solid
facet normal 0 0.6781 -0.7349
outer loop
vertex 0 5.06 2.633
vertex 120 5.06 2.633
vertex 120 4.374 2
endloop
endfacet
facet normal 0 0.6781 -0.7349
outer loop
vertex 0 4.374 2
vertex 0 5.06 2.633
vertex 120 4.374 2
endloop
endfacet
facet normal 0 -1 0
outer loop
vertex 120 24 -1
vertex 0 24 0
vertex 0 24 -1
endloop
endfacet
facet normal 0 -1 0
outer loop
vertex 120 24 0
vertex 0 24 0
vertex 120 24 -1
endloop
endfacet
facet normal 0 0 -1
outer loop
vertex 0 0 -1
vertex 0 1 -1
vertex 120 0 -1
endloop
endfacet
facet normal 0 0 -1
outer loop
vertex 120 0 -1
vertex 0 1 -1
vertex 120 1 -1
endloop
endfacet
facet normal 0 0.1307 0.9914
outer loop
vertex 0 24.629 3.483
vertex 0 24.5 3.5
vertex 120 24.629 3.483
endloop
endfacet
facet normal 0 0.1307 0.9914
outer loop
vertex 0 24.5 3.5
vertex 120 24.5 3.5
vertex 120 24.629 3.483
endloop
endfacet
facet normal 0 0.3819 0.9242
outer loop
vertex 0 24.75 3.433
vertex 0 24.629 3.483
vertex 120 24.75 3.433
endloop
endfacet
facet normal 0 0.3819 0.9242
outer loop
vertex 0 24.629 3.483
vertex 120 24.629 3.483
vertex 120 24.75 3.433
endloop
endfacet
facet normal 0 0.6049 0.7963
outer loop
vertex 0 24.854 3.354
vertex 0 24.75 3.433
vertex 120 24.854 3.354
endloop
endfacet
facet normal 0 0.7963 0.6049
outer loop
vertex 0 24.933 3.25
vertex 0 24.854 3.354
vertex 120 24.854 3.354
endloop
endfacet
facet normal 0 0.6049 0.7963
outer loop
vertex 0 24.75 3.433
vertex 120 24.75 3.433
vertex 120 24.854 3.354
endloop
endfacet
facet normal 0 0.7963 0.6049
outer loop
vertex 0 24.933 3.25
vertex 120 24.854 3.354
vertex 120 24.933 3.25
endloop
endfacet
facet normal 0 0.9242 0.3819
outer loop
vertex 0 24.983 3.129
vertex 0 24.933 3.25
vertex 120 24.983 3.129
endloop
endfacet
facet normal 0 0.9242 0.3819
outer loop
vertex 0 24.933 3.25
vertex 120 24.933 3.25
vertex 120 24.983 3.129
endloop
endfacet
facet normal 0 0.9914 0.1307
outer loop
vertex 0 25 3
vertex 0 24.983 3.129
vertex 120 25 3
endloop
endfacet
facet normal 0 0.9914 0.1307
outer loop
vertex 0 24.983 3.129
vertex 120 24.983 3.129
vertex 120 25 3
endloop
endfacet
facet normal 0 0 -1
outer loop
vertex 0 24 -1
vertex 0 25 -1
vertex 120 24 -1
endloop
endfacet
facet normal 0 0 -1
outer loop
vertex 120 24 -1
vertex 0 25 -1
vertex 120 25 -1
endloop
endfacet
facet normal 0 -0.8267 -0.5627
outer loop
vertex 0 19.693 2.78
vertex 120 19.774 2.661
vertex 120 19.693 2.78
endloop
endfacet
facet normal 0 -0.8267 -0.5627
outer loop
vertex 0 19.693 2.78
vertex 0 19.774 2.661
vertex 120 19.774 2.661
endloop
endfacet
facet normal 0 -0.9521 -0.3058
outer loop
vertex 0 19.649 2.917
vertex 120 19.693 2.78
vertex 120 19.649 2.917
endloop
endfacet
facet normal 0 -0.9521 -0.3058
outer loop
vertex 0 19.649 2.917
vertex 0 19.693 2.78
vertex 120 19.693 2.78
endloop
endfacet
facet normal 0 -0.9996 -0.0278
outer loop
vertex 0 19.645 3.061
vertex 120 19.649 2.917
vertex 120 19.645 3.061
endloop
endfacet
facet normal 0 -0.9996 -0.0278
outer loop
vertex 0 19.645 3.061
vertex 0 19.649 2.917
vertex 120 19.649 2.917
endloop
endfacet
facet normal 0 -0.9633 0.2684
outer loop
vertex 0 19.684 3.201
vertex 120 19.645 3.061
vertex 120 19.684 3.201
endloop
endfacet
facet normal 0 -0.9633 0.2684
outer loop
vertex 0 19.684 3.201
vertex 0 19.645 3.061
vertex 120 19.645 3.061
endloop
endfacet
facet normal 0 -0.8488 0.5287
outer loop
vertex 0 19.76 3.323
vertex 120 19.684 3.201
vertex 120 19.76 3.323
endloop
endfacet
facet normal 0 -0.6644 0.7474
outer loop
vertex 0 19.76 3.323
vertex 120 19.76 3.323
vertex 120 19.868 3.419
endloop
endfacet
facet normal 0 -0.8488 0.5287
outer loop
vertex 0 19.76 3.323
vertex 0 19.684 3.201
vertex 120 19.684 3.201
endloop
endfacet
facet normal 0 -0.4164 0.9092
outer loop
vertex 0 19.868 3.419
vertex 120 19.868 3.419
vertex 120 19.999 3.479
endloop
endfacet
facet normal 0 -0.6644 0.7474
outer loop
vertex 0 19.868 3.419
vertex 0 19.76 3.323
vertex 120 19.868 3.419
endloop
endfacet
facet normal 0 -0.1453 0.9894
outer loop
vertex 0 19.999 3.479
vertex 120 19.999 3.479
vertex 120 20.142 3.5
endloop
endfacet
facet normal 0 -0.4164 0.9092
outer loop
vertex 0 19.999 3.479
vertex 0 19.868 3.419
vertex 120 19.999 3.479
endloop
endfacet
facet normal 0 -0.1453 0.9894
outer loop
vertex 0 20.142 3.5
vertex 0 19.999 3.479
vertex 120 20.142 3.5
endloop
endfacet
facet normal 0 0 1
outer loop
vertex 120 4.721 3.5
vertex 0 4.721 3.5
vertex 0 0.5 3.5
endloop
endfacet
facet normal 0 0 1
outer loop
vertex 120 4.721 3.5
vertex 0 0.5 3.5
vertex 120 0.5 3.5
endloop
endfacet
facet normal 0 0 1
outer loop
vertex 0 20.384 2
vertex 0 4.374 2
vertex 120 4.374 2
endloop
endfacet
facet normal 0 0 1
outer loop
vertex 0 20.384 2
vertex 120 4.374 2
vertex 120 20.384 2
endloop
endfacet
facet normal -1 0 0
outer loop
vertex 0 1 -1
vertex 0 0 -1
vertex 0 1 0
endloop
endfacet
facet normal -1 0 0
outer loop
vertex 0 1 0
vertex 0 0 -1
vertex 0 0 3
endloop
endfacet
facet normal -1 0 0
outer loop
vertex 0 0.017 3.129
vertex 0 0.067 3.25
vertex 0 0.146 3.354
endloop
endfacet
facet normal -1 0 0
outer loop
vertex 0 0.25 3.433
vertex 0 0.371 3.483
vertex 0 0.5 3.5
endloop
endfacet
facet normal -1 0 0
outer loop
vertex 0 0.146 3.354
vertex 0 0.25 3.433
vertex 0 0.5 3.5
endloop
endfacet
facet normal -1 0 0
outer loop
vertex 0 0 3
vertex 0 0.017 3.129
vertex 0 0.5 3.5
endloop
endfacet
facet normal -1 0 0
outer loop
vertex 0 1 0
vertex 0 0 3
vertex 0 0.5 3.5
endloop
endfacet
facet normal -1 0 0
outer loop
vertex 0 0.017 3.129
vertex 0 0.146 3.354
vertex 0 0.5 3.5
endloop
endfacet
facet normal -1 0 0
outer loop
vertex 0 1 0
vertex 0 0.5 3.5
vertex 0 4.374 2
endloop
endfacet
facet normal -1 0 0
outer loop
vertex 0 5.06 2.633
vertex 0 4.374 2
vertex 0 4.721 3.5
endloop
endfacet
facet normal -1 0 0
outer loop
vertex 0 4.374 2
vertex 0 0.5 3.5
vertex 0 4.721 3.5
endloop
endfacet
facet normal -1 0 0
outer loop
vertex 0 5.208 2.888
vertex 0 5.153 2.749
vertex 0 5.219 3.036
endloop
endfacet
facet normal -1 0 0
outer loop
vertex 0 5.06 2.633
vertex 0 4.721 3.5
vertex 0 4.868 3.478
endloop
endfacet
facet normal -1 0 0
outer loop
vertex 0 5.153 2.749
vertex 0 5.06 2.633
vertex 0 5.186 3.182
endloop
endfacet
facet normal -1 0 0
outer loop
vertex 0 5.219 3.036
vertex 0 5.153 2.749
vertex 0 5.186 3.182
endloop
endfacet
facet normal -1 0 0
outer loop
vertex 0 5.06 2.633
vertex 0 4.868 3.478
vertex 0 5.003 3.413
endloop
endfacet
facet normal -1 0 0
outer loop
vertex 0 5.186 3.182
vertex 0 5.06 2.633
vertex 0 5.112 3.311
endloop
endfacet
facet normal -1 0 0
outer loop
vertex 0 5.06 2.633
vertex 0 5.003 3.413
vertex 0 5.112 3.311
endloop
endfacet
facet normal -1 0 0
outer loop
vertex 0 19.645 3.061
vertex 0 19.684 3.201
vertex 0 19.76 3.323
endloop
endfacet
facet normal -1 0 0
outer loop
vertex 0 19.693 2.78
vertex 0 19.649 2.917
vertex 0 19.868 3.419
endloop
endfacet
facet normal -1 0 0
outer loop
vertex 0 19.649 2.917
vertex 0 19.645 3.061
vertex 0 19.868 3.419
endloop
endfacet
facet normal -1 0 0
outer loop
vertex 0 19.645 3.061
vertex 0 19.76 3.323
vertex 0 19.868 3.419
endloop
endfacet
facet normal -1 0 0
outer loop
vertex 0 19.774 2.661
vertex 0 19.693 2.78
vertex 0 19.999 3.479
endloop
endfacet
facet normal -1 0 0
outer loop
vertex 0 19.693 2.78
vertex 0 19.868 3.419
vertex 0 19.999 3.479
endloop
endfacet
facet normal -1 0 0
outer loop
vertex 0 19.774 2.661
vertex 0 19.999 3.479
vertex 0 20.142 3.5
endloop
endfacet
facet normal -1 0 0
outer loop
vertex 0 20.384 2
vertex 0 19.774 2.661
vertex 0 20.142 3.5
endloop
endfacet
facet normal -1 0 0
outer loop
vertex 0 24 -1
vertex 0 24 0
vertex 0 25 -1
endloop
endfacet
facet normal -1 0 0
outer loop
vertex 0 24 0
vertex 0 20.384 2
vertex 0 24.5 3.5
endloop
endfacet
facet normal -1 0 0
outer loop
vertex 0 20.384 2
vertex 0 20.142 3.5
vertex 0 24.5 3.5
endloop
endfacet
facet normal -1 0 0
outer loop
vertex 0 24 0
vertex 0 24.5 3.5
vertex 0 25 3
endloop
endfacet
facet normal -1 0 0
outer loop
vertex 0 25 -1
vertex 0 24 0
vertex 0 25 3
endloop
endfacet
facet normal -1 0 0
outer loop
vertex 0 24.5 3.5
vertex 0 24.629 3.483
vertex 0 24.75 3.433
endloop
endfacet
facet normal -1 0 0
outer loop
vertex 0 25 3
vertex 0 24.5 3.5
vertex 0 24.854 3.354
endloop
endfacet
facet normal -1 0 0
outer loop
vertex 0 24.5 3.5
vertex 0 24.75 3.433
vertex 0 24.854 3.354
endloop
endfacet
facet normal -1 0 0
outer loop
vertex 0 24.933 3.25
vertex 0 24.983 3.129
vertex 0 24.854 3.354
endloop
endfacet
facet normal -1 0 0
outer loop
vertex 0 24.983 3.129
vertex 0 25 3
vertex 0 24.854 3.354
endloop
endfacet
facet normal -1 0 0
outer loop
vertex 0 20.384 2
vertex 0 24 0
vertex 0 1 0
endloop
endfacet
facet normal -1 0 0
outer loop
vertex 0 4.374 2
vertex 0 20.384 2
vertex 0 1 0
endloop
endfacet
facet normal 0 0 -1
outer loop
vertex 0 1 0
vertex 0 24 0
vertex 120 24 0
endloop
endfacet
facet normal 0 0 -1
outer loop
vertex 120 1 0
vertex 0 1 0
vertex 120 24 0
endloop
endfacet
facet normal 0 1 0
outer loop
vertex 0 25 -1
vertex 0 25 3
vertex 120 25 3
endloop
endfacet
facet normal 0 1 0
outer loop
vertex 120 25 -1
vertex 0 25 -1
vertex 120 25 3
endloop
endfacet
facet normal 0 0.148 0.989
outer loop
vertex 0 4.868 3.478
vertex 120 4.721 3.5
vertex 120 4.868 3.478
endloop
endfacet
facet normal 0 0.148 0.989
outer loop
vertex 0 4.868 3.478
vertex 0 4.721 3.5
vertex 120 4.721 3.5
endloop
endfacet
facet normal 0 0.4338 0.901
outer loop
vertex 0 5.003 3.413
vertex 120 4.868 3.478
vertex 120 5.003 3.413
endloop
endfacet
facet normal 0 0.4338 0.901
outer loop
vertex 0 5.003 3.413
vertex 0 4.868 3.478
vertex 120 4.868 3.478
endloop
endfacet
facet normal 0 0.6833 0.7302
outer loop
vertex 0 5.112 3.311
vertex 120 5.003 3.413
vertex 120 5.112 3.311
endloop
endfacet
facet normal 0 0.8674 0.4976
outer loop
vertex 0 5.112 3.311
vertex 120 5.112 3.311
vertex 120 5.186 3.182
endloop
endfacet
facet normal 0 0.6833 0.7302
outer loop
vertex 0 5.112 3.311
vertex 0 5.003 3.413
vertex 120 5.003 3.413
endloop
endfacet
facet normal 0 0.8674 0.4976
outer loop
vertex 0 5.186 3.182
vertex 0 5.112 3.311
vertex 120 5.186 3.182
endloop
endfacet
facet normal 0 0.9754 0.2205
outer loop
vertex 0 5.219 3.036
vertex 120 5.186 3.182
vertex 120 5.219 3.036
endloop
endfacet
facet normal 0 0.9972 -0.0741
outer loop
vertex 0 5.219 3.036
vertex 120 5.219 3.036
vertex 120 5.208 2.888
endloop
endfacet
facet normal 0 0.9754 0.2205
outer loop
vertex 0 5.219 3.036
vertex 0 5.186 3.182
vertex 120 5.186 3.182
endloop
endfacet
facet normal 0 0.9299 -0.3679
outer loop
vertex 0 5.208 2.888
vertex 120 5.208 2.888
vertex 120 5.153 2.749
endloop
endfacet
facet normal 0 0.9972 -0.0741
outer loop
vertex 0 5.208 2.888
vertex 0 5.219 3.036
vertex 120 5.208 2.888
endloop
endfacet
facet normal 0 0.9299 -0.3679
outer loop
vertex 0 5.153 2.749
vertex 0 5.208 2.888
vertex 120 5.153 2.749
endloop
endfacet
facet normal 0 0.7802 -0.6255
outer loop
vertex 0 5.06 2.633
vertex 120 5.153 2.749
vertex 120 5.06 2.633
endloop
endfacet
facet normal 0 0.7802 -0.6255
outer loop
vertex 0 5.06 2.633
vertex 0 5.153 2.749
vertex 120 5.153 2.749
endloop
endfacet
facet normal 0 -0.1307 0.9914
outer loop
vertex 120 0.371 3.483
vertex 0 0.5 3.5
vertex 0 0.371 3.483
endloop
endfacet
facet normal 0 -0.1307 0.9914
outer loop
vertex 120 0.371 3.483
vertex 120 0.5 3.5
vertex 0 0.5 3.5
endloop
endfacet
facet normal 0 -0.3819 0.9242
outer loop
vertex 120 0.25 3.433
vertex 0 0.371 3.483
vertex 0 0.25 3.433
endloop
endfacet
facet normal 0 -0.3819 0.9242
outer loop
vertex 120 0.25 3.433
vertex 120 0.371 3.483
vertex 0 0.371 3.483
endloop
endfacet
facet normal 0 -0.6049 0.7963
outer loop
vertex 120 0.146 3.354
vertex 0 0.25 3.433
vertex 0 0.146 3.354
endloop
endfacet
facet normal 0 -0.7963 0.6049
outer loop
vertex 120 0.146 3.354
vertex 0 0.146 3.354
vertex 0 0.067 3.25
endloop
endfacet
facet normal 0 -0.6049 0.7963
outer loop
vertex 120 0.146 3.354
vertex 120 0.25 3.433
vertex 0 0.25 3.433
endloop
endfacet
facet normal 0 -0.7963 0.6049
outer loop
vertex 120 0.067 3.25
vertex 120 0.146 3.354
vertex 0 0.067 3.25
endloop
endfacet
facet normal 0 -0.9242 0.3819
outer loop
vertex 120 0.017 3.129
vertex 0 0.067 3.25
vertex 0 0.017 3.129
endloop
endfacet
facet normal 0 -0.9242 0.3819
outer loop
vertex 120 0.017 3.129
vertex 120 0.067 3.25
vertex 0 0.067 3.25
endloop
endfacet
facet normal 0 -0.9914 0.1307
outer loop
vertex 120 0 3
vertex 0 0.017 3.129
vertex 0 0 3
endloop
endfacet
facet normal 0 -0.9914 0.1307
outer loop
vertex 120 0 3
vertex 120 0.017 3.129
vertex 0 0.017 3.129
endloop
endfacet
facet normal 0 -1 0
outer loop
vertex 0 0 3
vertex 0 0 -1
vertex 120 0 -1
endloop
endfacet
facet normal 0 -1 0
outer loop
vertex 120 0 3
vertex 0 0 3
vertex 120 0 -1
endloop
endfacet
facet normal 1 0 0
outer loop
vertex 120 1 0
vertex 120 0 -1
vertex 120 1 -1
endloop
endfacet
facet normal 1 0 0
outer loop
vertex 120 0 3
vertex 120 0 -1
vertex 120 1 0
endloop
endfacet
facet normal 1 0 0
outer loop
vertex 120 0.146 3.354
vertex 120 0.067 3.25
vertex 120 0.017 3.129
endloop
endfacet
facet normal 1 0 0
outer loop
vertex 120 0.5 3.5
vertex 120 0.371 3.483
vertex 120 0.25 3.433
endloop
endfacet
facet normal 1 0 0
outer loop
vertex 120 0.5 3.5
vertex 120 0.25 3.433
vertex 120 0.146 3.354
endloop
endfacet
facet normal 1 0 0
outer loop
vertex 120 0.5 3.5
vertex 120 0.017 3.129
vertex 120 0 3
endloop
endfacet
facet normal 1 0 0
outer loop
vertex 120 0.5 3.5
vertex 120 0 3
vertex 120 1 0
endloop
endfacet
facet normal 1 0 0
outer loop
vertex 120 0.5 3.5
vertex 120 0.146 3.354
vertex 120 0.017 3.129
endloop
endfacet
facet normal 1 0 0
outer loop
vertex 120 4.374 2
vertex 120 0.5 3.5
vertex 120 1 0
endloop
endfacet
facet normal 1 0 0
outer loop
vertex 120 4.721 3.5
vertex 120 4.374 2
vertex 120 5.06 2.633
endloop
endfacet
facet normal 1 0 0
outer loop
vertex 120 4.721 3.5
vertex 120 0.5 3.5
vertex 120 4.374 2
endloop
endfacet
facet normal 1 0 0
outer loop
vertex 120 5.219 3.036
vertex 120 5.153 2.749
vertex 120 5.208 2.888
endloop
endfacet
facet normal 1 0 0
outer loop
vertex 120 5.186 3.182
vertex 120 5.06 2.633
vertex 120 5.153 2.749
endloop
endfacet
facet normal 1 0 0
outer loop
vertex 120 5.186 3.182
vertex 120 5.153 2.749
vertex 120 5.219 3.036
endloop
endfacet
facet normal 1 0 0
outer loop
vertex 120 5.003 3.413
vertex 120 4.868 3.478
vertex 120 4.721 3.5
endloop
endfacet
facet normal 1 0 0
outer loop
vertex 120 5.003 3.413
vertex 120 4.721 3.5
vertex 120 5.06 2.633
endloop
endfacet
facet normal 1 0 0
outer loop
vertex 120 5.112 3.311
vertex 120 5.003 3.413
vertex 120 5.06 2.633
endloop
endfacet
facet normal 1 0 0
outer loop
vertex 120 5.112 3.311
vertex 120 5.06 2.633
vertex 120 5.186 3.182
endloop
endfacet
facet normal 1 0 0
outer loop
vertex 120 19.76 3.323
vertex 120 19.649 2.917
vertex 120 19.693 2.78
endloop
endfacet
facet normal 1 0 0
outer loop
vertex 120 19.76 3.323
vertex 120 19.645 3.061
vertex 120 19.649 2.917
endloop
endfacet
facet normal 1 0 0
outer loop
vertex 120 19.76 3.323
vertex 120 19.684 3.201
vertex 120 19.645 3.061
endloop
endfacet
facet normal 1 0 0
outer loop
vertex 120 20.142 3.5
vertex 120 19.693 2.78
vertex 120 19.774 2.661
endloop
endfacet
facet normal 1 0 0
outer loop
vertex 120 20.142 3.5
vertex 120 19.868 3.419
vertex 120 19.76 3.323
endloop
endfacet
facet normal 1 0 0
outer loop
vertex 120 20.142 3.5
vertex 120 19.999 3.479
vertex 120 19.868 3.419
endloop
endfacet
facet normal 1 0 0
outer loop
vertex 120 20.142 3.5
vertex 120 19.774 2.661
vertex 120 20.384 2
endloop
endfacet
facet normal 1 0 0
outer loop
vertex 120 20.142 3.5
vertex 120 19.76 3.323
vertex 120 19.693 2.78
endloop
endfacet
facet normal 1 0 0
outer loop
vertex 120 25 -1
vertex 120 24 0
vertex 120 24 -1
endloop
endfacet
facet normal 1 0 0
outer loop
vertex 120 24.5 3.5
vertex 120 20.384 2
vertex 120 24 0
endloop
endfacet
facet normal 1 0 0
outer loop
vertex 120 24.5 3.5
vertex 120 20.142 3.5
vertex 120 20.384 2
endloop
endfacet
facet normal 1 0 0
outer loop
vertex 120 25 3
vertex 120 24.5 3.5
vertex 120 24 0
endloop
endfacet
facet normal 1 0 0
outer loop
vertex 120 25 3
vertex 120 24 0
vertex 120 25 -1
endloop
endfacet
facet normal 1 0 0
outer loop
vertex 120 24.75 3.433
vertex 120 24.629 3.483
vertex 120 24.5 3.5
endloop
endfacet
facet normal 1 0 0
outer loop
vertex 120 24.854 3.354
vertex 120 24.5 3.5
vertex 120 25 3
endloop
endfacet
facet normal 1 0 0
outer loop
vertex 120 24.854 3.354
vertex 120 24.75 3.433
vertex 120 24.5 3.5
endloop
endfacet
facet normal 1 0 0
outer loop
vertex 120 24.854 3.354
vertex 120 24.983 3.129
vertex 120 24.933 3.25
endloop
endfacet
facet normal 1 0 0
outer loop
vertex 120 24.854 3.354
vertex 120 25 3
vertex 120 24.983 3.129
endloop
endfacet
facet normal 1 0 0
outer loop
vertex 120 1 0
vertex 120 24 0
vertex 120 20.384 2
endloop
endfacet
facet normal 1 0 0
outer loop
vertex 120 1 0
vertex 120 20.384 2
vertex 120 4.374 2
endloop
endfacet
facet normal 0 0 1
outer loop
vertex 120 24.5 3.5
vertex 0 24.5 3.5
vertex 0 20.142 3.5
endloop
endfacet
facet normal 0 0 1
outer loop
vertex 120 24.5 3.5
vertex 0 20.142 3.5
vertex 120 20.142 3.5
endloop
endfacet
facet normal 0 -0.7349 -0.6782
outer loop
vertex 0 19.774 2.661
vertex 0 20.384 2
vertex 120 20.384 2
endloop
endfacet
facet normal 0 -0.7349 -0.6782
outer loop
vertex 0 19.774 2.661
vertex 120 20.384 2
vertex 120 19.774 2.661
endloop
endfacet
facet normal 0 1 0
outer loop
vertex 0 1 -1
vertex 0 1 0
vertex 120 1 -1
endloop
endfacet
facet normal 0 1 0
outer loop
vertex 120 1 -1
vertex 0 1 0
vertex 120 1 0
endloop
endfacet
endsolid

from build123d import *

# Parameters (mm, degrees)
SKETCH1_W           = 120
SKETCH1_H           = 25
BOSS_EXTRUDE1_DEPTH = 3.5
SKETCH1_3_W         = 120
SKETCH1_3_H         = 1
BOSS_EXTRUDE2_DEPTH = 1
CUT_EXTRUDE1_DEPTH  = 121
FILLET1_R           = 0.5
FILLET2_R           = 0.5


with BuildPart() as part:
    # Sketch1 → Boss-Extrude1 (new body)
    with BuildSketch(Plane.XY):
        with Locations((60, 12.5)):
            Rectangle(SKETCH1_W, SKETCH1_H)
    extrude(amount=BOSS_EXTRUDE1_DEPTH)

    # Sketch1<3> → Boss-Extrude2 (add)
    with BuildSketch(Plane.XY):
        with Locations((60, 24.5)):
            Rectangle(SKETCH1_3_W, SKETCH1_3_H)
        with Locations((60, 0.5)):
            Rectangle(SKETCH1_3_W, SKETCH1_3_H)
    extrude(amount=-BOSS_EXTRUDE2_DEPTH)

    # Sketch3 → Cut-Extrude1 (cut, through all)
    with BuildSketch(Plane(origin=(120, 0, 0), x_dir=(0, 0, -1), z_dir=(1, 0, 0))):
        Polygon((-2, 20.384047046), (-3.5, 19), (-3.5, 6), (-2, 4.374332717), align=None)
    extrude(amount=-CUT_EXTRUDE1_DEPTH, mode=Mode.SUBTRACT)

    # Fillet1
    fillet1_edges = [part.edges().sort_by_distance(p)[0] for p in [
        (60, 19, 3.5),
        (60, 6, 3.5),
    ]]
    fillet(fillet1_edges, radius=FILLET1_R)

    # Fillet2
    fillet2_edges = [part.edges().sort_by_distance(p)[0] for p in [
        (60, 0, 3.5),
        (60, 25, 3.5),
    ]]
    fillet(fillet2_edges, radius=FILLET2_R)


solid = part.part
